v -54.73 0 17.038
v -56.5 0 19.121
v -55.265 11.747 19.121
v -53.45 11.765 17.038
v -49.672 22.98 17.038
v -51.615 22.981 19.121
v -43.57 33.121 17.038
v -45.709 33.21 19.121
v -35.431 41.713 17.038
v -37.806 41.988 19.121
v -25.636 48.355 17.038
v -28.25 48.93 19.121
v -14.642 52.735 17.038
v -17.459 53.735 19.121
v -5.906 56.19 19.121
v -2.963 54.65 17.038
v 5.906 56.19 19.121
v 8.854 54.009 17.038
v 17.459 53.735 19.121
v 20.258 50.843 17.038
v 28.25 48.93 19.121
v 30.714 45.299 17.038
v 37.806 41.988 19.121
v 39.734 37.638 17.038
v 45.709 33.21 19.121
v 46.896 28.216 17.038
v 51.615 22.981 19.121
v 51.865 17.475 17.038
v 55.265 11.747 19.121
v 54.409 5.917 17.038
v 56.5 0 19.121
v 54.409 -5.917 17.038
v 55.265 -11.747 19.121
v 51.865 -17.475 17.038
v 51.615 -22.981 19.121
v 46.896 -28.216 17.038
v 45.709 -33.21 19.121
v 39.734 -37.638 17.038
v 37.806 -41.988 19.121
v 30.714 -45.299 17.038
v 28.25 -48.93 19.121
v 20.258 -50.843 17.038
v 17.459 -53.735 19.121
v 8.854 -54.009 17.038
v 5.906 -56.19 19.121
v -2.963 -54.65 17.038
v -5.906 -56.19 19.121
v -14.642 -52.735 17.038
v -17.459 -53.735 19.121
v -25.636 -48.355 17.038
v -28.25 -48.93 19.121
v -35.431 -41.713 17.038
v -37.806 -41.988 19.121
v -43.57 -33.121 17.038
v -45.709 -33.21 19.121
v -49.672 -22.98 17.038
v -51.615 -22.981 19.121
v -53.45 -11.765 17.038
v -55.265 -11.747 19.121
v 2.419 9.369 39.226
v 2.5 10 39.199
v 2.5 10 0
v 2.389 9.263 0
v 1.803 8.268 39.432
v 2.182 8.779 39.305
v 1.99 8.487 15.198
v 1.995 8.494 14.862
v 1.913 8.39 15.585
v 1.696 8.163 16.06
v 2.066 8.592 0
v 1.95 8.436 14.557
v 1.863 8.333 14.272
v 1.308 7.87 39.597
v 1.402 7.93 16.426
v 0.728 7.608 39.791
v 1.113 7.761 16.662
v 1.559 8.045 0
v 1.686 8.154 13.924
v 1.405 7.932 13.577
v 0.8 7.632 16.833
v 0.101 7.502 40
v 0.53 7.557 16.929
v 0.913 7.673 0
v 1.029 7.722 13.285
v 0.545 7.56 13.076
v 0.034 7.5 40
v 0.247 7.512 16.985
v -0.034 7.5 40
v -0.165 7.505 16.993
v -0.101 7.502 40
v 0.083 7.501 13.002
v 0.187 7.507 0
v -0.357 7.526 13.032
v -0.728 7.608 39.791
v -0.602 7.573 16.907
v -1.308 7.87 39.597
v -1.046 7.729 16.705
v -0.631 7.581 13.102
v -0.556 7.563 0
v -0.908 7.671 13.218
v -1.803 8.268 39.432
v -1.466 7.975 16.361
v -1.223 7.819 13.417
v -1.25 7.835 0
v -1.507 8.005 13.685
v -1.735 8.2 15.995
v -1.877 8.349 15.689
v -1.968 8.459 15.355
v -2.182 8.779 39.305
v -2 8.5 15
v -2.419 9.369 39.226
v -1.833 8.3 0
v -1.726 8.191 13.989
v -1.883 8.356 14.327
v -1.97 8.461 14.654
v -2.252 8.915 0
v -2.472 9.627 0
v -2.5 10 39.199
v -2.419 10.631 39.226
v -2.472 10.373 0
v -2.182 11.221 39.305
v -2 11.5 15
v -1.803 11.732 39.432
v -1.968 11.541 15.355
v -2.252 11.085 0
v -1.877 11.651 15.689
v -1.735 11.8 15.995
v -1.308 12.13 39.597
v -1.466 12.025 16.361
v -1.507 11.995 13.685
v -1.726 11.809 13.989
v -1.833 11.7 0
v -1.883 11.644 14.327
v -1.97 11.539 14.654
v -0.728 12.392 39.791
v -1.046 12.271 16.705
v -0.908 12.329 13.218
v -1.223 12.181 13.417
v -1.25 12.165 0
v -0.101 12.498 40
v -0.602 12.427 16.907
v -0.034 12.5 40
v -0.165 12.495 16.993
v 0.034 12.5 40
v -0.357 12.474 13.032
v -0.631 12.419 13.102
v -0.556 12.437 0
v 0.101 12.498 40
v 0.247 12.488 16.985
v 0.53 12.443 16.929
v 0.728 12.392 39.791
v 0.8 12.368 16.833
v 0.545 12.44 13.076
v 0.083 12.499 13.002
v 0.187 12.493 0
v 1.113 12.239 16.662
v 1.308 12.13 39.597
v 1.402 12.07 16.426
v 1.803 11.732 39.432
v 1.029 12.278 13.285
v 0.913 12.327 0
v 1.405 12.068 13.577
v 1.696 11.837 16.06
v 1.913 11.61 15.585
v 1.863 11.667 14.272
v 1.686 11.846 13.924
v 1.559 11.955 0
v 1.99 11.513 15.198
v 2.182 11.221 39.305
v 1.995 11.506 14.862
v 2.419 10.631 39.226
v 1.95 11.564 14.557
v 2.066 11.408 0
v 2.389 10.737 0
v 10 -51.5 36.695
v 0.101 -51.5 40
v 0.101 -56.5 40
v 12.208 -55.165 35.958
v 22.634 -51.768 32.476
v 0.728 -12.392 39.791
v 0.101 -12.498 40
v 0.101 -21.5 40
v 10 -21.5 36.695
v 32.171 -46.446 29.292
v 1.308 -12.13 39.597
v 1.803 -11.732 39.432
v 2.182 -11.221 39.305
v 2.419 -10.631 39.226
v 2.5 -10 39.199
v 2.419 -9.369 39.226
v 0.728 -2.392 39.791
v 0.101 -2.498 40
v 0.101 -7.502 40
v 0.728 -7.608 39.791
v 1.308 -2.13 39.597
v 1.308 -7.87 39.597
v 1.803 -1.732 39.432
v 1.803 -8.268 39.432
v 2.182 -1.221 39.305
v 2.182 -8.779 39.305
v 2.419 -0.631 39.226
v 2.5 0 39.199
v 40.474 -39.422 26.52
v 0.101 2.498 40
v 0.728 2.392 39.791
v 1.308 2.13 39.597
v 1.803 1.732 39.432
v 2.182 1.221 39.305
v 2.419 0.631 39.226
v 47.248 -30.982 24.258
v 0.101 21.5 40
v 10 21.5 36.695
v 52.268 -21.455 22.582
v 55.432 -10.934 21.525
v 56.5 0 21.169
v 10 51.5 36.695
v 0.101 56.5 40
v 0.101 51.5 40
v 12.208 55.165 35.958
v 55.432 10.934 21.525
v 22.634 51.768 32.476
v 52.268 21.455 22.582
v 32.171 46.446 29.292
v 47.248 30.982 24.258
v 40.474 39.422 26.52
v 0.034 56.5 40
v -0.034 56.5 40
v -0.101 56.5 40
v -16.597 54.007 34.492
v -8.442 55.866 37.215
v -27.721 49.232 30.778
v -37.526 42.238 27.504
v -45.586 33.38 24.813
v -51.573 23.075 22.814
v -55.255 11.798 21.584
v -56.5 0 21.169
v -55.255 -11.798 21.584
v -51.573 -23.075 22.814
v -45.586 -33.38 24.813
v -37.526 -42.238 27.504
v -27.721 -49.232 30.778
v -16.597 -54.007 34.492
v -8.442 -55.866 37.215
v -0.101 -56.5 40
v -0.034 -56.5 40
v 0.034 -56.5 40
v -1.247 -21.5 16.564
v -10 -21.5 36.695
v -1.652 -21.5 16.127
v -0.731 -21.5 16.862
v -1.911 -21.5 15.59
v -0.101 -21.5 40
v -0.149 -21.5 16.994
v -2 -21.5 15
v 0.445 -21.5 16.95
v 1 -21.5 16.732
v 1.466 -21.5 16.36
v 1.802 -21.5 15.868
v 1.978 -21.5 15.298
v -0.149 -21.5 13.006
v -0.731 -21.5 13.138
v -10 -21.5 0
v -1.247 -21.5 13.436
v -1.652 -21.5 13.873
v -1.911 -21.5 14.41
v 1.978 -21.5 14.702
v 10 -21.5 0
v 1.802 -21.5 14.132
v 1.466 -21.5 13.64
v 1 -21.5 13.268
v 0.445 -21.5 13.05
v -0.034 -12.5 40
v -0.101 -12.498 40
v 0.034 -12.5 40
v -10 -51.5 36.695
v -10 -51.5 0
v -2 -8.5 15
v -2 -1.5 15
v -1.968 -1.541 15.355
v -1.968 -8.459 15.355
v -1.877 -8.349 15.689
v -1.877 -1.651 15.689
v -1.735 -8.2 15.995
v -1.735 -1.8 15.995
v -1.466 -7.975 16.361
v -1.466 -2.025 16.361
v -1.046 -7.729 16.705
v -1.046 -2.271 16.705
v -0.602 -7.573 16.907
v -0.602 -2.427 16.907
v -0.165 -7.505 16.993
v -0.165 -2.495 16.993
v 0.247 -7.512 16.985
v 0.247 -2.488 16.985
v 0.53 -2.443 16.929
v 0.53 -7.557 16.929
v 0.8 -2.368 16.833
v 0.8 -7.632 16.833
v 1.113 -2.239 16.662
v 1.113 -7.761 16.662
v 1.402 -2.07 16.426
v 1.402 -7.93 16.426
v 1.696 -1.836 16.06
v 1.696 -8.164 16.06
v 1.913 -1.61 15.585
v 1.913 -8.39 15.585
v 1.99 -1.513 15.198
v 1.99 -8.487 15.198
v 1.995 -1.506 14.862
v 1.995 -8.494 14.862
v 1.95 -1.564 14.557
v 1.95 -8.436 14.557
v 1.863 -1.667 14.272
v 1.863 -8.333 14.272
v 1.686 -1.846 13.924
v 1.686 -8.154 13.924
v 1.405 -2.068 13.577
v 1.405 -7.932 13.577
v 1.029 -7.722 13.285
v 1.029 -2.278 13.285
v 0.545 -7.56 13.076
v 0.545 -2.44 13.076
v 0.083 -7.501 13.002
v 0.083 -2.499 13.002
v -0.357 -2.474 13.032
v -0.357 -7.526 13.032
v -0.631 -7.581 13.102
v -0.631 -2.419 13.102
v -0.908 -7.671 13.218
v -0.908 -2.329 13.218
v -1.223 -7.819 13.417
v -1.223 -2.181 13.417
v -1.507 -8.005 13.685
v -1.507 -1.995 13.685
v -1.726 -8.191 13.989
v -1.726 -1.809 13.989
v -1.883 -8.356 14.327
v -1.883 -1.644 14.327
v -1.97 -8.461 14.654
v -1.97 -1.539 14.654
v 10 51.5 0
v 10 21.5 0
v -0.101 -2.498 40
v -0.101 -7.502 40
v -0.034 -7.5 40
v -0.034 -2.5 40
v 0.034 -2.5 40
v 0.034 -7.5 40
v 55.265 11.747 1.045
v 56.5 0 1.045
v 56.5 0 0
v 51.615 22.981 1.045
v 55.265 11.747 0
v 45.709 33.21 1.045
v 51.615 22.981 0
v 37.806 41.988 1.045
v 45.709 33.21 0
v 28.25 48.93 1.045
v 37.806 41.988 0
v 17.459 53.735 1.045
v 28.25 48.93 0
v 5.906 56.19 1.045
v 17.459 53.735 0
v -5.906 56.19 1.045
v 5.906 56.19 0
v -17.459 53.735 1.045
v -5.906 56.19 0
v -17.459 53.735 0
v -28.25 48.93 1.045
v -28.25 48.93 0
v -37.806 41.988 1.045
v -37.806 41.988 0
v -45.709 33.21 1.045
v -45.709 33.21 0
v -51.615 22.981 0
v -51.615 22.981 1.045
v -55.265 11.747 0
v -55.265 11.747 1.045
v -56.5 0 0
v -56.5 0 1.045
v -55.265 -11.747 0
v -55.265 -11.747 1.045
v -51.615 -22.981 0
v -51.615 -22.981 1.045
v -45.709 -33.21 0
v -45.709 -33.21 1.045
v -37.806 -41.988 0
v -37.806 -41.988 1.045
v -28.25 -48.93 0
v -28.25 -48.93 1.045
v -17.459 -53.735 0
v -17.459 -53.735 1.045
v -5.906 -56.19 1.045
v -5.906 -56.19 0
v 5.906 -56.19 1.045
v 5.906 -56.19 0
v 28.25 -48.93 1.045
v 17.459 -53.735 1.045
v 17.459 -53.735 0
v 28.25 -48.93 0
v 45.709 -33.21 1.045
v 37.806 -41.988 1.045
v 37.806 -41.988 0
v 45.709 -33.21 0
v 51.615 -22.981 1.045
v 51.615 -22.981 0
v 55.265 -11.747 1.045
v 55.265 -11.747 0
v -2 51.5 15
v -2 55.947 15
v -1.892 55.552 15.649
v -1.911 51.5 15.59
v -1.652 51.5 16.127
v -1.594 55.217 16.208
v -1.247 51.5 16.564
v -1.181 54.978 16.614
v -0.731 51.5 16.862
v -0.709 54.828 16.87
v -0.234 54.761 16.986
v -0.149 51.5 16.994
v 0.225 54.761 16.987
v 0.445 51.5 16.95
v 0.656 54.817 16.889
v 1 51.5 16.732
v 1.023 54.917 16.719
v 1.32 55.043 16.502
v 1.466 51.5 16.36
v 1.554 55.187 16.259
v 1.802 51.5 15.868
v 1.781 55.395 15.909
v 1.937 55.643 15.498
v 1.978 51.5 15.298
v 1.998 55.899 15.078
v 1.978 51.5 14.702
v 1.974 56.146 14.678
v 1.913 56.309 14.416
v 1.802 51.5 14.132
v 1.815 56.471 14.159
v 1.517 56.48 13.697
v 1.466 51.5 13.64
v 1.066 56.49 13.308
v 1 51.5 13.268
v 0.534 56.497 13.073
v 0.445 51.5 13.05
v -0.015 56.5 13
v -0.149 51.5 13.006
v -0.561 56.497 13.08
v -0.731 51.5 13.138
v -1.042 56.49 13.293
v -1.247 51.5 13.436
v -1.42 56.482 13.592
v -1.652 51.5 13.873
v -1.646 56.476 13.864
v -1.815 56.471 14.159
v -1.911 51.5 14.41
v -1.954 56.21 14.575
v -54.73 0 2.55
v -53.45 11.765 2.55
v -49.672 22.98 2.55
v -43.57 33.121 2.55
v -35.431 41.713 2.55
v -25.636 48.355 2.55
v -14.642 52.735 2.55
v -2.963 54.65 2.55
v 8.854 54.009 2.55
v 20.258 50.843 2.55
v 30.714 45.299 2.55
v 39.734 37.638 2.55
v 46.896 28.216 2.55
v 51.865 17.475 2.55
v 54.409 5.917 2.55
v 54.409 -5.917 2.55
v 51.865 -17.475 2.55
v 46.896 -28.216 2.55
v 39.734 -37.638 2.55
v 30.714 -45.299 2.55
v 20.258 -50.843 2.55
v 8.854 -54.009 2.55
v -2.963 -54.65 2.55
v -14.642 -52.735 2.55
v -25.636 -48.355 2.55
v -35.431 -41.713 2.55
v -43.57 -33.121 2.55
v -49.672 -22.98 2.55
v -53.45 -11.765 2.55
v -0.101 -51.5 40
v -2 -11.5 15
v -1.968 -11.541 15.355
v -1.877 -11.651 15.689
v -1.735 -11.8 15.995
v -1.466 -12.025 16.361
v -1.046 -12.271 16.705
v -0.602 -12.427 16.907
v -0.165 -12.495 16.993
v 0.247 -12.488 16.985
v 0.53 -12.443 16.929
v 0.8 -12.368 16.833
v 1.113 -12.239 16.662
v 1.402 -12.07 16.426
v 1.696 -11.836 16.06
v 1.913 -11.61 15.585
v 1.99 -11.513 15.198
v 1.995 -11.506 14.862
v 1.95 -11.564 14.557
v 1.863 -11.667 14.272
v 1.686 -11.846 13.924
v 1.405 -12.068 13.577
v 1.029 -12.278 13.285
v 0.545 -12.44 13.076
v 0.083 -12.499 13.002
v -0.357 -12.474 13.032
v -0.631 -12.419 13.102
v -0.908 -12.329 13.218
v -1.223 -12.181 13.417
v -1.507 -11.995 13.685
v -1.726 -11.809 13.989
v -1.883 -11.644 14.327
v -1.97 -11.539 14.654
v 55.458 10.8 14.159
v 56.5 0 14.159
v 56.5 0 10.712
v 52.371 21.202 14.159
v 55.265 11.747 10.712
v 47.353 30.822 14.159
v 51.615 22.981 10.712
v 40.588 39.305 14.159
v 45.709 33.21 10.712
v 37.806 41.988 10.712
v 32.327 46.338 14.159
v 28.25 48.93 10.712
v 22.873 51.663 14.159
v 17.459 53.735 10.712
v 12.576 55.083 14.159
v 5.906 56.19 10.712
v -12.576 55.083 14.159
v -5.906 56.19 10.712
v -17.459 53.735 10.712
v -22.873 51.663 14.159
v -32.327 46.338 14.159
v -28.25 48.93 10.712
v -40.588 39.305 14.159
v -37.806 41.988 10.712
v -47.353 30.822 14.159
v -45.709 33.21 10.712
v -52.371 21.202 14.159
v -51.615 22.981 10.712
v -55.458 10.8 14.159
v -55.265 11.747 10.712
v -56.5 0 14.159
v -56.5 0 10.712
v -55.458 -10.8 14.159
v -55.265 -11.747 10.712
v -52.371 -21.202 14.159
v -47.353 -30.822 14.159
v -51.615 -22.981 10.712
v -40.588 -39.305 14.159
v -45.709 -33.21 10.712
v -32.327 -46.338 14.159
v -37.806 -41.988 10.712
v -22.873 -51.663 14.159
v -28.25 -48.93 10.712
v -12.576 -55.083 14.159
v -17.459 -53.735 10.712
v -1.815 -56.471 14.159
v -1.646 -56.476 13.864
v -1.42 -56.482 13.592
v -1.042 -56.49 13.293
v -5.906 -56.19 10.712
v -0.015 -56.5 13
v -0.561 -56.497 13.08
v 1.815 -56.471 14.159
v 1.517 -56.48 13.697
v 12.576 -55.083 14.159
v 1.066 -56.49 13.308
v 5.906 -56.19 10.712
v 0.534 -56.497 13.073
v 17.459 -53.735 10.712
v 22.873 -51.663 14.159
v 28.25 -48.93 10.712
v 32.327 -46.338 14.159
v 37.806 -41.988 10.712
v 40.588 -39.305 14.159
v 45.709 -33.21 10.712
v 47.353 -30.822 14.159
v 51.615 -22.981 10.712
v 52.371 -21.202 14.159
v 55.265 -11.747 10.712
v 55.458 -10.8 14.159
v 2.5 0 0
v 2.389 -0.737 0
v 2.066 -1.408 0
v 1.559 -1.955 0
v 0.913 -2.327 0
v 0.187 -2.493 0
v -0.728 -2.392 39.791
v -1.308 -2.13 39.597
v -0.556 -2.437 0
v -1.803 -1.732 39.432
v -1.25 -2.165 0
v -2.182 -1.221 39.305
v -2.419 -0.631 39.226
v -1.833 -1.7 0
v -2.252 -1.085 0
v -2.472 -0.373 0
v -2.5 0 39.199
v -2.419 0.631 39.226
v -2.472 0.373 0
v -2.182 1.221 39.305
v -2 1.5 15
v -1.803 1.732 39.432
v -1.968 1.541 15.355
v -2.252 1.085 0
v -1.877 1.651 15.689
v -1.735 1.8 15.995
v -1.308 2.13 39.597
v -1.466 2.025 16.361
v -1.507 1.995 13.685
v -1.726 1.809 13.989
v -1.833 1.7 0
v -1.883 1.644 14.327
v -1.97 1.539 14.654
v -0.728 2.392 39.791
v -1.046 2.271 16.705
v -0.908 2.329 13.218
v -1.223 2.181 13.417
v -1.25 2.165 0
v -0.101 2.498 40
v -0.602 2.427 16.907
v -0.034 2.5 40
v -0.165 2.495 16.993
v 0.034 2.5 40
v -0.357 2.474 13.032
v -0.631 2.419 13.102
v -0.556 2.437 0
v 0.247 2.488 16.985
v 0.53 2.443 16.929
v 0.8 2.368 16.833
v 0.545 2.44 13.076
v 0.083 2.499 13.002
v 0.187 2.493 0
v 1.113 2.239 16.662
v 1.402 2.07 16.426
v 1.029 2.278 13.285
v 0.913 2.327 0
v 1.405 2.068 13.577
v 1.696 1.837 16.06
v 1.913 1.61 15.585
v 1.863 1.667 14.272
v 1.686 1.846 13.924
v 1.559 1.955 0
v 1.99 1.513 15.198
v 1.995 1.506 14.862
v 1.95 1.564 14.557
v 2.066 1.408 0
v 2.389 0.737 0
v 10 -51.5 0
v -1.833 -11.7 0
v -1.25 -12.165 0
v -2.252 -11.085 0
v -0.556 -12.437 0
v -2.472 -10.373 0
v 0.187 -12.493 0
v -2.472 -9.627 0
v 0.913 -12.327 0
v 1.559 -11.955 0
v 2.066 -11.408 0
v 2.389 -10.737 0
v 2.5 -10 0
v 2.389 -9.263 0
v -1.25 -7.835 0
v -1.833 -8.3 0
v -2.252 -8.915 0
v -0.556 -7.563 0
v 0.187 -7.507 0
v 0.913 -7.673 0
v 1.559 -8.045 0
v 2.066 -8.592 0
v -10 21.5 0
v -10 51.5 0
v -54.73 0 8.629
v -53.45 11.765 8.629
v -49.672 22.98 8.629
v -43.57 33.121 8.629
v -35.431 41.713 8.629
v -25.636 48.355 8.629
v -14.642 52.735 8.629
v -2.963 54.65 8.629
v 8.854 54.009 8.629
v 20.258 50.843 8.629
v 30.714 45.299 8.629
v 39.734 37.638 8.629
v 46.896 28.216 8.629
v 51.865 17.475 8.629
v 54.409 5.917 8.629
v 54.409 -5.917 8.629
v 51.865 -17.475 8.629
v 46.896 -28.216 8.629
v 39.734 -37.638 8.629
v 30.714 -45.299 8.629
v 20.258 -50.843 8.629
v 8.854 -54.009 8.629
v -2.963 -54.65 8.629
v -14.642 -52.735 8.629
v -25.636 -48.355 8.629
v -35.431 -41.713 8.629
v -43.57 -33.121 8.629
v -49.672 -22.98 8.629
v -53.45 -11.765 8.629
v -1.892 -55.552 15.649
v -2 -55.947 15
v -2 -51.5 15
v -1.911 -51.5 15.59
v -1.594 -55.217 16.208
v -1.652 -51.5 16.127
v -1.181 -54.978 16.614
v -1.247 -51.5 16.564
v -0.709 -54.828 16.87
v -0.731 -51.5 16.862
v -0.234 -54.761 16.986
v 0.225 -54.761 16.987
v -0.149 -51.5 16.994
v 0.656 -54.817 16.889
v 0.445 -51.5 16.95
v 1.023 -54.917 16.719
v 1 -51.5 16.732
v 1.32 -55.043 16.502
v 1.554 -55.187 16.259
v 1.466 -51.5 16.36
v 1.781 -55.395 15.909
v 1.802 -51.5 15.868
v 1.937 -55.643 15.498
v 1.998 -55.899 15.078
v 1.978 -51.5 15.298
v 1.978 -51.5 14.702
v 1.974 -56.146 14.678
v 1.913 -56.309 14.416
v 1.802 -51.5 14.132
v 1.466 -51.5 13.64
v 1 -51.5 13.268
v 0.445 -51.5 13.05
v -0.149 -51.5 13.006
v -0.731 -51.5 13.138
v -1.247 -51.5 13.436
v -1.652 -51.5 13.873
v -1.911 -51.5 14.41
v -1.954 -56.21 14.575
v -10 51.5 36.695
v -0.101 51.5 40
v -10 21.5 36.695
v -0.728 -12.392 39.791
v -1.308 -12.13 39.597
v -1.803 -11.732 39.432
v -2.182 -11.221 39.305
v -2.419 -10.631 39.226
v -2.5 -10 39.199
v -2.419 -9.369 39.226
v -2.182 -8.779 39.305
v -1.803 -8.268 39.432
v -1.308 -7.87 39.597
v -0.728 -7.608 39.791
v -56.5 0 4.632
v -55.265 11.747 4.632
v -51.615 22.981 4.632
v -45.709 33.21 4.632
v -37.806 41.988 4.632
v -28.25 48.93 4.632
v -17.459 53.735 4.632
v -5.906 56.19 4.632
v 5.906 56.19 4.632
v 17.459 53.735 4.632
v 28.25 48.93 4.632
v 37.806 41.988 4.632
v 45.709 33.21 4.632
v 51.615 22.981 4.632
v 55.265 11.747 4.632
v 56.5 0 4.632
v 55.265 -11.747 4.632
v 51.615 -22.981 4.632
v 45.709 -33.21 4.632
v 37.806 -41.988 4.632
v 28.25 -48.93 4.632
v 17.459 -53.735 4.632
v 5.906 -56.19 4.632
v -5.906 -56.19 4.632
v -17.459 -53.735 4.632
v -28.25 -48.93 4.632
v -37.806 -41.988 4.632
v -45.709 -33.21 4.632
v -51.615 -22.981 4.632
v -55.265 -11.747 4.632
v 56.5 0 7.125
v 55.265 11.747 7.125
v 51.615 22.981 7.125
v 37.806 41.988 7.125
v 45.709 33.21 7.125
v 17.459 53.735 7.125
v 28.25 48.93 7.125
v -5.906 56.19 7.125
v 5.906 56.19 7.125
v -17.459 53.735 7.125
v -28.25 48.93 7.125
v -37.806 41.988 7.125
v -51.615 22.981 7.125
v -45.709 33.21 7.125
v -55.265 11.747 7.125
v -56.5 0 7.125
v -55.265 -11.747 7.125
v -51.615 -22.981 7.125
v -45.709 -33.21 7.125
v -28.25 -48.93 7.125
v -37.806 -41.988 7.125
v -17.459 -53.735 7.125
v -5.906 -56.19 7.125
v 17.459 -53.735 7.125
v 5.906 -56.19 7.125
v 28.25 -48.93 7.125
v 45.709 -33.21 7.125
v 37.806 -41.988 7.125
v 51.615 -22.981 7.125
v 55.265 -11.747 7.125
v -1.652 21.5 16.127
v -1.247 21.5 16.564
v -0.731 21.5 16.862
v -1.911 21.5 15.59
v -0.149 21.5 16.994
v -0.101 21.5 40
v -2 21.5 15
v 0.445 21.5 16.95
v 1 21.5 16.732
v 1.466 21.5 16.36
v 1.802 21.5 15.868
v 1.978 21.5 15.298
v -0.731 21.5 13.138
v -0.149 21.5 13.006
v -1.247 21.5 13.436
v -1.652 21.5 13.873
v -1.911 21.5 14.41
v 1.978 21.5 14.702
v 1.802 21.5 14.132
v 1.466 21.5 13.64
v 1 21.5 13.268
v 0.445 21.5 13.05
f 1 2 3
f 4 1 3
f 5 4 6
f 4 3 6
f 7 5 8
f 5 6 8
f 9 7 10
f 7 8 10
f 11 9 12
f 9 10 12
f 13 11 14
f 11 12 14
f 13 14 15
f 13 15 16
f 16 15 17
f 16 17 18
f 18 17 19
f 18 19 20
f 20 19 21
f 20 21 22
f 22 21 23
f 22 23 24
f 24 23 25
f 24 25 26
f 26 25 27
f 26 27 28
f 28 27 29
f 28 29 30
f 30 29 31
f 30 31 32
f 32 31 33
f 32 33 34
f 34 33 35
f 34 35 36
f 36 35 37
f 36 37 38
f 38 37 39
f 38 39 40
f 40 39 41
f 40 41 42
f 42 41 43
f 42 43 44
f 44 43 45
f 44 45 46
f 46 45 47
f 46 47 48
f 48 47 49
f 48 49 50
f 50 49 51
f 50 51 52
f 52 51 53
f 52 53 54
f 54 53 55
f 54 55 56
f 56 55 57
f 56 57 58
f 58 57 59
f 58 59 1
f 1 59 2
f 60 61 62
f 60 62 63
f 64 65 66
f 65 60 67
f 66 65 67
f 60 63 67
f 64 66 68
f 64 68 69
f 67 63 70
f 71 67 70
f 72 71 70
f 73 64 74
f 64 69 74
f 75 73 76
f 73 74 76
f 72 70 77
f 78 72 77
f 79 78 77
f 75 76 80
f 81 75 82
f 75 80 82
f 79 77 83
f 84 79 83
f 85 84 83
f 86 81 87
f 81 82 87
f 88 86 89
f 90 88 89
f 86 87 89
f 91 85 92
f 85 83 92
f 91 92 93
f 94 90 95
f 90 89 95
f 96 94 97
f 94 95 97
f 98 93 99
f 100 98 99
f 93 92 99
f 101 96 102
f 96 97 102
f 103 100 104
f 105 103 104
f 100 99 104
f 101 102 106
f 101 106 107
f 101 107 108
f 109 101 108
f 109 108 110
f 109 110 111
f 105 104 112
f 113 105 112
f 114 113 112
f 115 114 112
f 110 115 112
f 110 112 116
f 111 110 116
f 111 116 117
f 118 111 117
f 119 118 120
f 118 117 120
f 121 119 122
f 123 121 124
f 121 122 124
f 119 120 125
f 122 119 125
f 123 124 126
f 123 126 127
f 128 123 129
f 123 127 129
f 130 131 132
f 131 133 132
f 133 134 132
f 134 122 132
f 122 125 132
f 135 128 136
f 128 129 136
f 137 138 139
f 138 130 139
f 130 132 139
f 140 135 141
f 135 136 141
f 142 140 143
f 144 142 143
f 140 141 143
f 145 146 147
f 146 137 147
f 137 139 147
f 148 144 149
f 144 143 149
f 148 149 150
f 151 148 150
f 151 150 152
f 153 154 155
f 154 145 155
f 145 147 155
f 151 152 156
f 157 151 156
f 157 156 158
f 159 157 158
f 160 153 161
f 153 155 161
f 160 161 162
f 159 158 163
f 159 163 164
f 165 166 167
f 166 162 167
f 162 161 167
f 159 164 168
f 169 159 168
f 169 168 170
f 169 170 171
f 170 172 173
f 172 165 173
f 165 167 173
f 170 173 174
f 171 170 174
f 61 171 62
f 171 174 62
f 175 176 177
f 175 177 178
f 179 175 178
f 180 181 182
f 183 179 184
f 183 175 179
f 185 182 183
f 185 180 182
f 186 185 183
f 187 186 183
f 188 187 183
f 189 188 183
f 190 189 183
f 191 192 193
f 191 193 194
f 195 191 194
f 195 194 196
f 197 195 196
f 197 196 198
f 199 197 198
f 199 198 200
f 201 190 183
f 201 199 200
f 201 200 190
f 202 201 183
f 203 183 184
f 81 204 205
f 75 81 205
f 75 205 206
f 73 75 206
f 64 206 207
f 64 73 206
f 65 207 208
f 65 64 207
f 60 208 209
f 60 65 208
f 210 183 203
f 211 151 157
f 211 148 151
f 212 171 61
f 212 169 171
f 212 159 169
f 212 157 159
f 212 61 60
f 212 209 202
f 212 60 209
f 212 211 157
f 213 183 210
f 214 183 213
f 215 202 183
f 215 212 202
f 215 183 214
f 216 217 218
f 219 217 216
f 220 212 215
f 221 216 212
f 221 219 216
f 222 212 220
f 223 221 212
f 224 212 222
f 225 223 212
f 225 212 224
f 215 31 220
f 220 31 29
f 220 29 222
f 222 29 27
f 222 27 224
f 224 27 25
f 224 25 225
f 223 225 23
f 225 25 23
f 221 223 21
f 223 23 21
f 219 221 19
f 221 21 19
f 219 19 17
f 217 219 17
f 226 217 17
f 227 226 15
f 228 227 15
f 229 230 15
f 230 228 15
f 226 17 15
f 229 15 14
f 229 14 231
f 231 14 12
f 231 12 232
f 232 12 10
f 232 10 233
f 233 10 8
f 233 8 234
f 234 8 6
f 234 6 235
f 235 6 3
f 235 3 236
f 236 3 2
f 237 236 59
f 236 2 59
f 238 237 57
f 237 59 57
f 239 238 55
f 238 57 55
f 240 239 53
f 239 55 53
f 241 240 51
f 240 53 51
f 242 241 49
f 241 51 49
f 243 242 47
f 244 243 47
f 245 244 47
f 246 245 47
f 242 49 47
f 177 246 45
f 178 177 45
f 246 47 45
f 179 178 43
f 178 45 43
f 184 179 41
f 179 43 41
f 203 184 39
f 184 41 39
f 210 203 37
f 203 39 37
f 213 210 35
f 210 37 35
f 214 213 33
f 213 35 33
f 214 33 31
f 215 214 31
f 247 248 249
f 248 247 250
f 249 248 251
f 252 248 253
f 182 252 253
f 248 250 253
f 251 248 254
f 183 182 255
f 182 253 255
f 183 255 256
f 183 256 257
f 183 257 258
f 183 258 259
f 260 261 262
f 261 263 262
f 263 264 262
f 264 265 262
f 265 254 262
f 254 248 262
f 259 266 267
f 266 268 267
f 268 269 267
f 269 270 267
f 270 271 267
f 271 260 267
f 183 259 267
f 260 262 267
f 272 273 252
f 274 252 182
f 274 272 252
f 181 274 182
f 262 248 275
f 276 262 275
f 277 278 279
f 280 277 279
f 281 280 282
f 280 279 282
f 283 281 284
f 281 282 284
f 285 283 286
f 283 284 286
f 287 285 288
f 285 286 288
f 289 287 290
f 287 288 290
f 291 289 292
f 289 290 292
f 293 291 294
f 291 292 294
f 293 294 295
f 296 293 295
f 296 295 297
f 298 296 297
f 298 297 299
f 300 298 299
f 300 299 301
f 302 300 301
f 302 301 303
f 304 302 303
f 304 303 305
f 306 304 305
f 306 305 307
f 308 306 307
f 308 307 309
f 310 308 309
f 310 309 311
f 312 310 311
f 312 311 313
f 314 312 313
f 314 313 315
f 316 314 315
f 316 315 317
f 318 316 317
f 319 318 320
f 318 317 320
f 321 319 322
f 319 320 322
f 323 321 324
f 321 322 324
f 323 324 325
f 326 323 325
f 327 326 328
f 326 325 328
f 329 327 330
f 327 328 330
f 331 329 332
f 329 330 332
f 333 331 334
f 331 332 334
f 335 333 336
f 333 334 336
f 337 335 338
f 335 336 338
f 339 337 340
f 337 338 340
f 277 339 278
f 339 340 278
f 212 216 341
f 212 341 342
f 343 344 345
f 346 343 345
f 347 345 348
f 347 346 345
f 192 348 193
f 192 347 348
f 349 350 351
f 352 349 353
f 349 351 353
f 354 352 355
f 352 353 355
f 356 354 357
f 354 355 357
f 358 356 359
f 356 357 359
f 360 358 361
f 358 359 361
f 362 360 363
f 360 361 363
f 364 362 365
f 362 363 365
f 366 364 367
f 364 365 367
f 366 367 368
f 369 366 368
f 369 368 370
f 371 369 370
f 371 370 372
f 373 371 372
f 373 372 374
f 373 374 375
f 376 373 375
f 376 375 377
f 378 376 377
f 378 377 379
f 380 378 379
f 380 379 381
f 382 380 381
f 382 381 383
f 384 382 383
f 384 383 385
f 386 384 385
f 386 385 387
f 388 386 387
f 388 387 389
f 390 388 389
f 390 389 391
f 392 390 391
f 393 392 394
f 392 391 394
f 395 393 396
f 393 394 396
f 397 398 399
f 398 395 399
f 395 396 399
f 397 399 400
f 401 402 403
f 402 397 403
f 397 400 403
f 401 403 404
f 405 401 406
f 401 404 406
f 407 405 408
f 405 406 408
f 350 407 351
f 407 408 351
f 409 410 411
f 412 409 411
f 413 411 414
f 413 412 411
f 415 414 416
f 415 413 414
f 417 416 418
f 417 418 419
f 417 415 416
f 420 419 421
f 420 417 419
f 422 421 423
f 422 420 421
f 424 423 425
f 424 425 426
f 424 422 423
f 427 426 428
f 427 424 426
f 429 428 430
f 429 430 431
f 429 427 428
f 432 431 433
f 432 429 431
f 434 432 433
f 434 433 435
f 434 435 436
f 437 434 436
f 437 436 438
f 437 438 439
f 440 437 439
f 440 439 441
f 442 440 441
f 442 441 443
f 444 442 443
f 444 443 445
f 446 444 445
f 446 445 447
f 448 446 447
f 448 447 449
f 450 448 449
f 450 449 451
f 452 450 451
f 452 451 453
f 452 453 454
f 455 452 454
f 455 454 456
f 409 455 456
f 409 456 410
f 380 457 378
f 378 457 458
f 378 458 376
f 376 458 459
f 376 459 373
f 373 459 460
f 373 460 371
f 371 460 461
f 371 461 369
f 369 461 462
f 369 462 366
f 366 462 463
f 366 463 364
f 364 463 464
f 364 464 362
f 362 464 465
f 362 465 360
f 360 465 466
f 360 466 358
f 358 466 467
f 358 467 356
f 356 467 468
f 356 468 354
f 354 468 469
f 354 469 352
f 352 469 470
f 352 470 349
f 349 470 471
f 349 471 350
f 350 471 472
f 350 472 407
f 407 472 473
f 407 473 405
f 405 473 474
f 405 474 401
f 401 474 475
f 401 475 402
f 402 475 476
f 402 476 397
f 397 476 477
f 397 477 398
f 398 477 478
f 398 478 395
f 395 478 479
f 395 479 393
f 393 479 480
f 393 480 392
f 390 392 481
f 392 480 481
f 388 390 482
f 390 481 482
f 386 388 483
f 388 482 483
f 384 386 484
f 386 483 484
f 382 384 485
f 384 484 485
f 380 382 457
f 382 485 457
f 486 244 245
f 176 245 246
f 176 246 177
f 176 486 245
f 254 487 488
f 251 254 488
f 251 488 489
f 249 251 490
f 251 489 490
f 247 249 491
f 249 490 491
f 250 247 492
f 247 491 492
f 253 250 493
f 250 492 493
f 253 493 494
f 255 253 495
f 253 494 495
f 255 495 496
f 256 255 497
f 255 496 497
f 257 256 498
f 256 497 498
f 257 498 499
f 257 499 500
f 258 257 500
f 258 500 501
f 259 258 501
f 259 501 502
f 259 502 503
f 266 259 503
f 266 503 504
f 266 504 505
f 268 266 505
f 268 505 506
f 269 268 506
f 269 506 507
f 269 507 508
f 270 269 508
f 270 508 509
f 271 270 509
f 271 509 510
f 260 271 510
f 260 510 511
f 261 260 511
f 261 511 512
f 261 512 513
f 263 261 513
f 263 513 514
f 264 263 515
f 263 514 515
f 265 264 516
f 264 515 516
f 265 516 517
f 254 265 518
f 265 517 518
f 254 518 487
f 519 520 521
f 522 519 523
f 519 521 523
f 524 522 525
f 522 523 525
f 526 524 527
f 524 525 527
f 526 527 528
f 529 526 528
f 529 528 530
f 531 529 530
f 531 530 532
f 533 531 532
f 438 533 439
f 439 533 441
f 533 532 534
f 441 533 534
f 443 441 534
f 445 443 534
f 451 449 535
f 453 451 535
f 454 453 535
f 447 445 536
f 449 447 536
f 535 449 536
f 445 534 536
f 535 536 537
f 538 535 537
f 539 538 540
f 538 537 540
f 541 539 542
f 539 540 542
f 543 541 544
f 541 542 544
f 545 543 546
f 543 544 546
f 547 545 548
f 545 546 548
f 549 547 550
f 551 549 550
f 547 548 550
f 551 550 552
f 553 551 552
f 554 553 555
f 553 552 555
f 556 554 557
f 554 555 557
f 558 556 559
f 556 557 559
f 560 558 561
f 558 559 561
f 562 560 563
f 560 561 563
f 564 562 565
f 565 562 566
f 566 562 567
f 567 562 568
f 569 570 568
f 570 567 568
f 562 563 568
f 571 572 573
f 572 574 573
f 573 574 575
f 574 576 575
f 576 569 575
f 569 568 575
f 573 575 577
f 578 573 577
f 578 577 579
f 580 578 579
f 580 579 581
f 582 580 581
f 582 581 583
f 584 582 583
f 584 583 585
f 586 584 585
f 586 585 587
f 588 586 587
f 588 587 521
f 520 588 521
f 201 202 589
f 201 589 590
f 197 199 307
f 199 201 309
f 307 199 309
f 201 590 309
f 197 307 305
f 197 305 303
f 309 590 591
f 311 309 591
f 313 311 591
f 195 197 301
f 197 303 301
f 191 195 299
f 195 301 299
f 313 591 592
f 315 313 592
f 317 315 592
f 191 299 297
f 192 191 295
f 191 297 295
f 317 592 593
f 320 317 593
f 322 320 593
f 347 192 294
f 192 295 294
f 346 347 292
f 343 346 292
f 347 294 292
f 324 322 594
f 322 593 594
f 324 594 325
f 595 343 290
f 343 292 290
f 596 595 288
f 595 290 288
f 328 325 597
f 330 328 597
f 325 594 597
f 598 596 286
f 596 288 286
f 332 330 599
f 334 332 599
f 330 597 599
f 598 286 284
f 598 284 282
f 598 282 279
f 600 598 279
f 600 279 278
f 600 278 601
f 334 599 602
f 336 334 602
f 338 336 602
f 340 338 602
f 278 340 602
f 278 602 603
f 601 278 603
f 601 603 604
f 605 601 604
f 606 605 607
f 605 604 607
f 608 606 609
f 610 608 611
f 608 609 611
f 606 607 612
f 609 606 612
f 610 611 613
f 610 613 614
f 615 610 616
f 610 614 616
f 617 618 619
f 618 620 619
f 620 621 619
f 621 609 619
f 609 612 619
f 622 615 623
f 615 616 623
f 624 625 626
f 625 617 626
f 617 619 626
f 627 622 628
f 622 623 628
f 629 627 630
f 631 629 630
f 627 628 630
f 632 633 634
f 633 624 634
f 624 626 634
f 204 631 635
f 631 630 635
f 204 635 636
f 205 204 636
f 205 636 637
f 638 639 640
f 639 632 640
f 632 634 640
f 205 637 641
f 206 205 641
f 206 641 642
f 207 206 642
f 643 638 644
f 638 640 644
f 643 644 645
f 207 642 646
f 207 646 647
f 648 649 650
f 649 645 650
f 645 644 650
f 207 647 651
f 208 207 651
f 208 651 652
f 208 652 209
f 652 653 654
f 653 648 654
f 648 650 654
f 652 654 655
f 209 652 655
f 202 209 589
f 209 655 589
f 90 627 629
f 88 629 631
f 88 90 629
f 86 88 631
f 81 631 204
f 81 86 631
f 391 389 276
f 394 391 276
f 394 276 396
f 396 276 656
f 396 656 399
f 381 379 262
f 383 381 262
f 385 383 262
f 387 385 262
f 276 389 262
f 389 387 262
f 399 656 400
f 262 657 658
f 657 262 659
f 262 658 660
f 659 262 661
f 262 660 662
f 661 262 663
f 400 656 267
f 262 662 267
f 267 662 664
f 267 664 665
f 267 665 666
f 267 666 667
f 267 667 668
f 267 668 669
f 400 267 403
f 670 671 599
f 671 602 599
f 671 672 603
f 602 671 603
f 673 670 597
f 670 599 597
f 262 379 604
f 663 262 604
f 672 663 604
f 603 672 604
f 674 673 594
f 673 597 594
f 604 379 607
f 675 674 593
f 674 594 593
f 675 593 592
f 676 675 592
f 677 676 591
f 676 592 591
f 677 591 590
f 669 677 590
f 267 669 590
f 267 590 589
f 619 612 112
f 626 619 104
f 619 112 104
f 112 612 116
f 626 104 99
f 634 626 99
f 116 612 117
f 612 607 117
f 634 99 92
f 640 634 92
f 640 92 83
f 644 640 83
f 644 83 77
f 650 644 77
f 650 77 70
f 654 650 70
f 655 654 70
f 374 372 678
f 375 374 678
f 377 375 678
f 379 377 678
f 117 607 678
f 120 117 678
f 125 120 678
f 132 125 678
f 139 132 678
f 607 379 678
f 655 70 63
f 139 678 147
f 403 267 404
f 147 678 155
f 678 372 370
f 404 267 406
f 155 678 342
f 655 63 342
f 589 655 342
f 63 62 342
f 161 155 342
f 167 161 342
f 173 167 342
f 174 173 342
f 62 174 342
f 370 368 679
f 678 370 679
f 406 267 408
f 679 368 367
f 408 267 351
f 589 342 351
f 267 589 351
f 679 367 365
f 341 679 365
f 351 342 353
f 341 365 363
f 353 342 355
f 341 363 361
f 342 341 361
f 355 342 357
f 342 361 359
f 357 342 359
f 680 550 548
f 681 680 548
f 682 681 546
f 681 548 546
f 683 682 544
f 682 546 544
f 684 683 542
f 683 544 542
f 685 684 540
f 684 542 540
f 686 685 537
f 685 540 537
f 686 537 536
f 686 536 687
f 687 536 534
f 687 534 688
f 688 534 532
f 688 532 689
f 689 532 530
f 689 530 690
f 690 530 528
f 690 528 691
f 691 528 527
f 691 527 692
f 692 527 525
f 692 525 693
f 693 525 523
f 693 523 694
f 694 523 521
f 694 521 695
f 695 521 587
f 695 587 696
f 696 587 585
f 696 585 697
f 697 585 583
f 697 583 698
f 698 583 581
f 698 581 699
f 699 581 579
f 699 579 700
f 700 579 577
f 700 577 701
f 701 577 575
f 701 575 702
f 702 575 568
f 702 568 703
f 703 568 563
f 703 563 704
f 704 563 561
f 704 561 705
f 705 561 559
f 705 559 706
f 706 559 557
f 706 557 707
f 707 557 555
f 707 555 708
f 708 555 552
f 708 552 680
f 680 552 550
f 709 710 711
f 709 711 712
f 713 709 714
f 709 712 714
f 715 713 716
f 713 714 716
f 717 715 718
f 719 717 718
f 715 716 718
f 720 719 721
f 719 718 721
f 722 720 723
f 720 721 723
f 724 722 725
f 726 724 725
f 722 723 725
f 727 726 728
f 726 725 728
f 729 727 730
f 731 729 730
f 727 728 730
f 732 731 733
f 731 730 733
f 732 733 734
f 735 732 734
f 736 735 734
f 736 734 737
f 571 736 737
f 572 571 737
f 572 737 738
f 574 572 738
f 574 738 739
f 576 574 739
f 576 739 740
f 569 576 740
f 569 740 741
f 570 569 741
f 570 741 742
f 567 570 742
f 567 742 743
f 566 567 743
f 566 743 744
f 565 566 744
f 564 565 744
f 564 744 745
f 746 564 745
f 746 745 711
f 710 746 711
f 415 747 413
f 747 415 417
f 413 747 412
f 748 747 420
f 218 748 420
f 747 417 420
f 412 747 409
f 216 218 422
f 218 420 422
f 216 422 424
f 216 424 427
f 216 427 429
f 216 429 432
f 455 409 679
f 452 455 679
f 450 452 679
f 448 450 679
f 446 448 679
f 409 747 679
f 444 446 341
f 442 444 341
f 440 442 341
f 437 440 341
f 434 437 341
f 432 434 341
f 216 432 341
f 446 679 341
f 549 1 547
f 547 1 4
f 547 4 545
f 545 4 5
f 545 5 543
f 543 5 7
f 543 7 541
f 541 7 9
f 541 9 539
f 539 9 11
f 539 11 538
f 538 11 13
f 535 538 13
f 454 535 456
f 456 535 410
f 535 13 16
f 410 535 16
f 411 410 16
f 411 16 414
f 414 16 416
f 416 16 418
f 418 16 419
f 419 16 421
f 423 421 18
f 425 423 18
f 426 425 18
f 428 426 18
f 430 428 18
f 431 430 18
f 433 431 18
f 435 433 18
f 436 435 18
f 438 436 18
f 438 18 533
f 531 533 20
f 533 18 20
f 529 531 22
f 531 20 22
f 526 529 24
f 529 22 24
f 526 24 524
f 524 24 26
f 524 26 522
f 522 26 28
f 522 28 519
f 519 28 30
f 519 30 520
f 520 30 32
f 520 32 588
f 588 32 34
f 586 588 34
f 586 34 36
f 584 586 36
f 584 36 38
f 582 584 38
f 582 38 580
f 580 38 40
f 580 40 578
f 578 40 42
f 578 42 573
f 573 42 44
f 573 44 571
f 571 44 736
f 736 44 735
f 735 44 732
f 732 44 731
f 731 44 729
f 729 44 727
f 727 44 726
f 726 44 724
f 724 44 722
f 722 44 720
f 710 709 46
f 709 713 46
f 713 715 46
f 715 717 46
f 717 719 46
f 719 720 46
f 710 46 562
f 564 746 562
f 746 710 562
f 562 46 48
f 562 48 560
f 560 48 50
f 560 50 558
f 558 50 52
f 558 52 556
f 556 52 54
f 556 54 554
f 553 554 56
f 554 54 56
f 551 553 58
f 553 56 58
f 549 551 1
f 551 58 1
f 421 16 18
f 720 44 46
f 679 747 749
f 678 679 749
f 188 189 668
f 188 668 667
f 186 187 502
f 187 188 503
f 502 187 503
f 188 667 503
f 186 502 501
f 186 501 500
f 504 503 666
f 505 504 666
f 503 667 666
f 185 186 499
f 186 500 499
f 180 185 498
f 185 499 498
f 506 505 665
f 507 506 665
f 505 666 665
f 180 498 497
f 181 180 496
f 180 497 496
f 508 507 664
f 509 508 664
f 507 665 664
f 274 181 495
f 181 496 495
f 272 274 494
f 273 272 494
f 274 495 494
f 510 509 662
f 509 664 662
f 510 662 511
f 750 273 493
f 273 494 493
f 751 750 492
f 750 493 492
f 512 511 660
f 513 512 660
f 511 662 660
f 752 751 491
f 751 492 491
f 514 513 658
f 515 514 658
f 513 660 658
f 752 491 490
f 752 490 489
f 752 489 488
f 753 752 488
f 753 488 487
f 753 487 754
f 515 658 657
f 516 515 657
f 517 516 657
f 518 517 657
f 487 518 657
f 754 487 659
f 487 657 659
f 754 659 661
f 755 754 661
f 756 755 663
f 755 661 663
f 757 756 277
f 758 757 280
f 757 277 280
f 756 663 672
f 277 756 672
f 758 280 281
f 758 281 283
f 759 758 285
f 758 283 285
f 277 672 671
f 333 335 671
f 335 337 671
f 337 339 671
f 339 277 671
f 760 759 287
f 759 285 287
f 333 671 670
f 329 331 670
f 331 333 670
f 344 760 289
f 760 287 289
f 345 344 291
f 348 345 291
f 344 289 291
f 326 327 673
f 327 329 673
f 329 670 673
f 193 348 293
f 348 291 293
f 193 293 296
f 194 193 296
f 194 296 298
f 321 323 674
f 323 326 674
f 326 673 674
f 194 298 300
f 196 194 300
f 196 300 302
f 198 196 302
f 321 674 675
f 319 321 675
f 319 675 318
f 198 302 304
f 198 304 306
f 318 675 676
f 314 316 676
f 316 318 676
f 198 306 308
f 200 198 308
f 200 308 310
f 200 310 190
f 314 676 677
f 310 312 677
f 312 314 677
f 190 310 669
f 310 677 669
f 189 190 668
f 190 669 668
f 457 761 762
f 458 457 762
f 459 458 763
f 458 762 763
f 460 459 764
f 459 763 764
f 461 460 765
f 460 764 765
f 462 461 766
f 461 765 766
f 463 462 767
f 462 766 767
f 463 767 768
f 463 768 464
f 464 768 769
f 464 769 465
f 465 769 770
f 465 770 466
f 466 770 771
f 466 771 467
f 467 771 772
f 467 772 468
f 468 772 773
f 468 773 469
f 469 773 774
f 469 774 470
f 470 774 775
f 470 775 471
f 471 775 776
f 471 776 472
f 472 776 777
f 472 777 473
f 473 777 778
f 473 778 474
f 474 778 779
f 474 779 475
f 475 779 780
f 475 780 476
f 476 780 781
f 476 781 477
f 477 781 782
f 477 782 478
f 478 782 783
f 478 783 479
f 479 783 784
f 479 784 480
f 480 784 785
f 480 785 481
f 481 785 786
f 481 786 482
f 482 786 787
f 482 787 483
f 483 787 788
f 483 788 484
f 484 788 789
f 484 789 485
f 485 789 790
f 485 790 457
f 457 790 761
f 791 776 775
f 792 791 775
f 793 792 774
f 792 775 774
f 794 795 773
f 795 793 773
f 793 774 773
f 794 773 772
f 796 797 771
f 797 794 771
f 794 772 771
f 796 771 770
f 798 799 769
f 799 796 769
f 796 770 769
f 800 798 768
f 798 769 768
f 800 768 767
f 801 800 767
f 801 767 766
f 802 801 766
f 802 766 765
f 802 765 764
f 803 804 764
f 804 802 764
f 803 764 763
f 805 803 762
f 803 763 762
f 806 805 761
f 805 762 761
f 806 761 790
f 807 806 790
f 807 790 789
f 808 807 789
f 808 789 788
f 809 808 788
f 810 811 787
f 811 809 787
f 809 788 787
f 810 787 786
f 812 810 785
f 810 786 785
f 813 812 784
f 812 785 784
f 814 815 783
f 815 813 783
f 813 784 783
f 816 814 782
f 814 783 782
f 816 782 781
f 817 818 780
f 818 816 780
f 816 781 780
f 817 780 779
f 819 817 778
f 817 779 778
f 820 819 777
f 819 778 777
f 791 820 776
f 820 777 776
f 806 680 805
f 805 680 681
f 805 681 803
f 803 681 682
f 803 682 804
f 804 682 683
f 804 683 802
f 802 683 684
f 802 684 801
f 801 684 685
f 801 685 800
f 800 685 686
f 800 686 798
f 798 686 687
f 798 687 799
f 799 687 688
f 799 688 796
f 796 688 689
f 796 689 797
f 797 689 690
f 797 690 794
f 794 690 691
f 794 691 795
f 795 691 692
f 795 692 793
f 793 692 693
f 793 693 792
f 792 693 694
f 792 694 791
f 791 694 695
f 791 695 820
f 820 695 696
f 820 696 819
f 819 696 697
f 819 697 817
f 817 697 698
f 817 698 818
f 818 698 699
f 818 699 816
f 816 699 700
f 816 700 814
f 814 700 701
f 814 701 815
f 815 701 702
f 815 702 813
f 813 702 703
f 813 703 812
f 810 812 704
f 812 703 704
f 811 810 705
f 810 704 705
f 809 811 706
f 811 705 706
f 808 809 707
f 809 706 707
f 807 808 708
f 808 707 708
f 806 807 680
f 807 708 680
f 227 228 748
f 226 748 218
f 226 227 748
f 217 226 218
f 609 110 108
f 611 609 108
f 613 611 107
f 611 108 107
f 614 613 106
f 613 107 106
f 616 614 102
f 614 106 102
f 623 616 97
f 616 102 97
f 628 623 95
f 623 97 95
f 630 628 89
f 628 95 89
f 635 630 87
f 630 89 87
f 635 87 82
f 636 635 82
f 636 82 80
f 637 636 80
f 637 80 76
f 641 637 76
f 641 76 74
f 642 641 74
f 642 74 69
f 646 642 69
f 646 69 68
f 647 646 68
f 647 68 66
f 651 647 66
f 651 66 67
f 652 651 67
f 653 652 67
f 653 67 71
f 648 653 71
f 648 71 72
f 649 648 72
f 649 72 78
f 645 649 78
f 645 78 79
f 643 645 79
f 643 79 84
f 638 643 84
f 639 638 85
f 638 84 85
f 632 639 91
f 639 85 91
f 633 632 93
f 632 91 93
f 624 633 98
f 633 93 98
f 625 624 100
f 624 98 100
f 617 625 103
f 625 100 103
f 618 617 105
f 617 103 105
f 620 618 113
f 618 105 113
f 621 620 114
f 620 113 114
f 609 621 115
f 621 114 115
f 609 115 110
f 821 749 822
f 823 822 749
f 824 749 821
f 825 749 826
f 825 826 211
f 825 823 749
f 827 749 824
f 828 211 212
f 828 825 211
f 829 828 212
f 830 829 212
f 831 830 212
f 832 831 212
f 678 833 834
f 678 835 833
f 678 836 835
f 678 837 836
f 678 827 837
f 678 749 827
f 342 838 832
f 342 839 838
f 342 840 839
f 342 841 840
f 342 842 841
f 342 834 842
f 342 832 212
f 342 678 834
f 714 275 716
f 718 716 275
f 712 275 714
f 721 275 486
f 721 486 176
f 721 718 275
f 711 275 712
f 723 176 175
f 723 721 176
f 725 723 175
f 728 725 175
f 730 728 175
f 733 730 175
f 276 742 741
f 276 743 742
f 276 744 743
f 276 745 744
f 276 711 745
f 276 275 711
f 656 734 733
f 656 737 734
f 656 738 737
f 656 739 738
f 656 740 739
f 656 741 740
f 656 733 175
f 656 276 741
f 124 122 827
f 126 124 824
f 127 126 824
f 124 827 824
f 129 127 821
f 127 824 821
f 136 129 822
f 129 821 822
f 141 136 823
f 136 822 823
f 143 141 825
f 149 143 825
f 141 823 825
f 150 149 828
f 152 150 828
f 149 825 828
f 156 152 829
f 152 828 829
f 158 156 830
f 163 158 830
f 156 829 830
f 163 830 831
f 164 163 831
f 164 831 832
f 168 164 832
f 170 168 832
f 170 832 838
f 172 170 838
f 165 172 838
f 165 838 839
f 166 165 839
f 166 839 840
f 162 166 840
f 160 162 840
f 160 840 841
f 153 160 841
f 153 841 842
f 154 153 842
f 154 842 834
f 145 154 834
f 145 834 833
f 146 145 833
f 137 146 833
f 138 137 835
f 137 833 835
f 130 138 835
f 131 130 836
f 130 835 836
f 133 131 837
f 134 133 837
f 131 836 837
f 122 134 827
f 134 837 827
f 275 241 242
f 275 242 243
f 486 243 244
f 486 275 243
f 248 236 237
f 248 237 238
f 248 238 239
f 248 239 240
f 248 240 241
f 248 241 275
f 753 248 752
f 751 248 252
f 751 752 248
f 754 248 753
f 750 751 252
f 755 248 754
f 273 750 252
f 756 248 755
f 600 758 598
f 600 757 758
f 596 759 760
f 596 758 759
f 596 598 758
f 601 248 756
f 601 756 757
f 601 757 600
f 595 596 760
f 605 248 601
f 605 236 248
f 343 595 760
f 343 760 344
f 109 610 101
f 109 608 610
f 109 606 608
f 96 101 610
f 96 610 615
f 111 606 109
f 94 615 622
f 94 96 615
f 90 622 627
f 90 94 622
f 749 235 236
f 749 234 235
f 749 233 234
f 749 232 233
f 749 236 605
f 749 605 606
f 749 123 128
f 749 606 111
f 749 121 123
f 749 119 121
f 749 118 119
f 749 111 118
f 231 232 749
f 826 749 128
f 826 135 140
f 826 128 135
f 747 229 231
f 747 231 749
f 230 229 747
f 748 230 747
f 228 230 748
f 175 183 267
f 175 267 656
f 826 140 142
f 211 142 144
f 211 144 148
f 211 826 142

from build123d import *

# Parameters (mm, degrees)
F0_R          = 56.5
F1_DEPTH      = 40
F3_DEPTH      = 56.501
F3_DEPTH_BACK = 56.501
F4_R          = 2.5
F4_W          = 20
F4_H          = 30
F5_DEPTH      = 40.001
F6_R          = 2
F7_DEPTH      = 78.001
F7_DEPTH_BACK = 35.001


with BuildPart() as f1:
    # F0 (on Top) → F1 (new body)
    with BuildSketch(Plane.XY):
        Circle(F0_R)
    extrude(amount=F1_DEPTH)

    # F2 (on Front) → F3 (cut, two sides)
    with BuildSketch(Plane.XZ) as f3_sk:
        Polygon((-60, 20), (0, 40.03386572), (60, 20), (60, 50.03386572), (0, 50.03386572), (-60, 50.03386572), align=None)
    extrude(amount=-F3_DEPTH, mode=Mode.SUBTRACT)
    extrude(f3_sk.sketch, amount=F3_DEPTH_BACK, mode=Mode.SUBTRACT)

    # F4 (on face) → F5 (cut, through all)
    with BuildSketch(Plane(origin=(0, 0, 0), x_dir=(1, 0, 0), z_dir=(0, 0, -1))):
        Circle(F4_R)
        with Locations((0, -10)):
            Circle(F4_R)
        with Locations((0, 10)):
            Circle(F4_R)
        with Locations((0, 36.5)):
            Rectangle(F4_W, F4_H)
        with Locations((0, -36.5)):
            Rectangle(F4_W, F4_H)
    extrude(amount=-F5_DEPTH, mode=Mode.SUBTRACT)

    # F6 (on face) → F7 (cut, two sides)
    with BuildSketch(Plane(origin=(0, 21.5, 0), x_dir=(-1, 0, 0), z_dir=(0, 1, 0))) as f7_sk:
        with Locations((0, 15)):
            Circle(F6_R)
    extrude(amount=-F7_DEPTH, mode=Mode.SUBTRACT)
    extrude(f7_sk.sketch, amount=F7_DEPTH_BACK, mode=Mode.SUBTRACT)

    # F8 (on Front) → F9 (revolve, cut)
    with BuildSketch(Plane.XZ):
        Polygon((-54.7298887074, 17.0381178779), (-57.7298887074, 20.5675298348), (-93.4339091182, 20.5675298348), (-93.4339091182, 0), (-57.7298887074, 0), (-54.7298887074, 2.5499998611), (-57.7298887074, 6.0794118181), (-54.7298887074, 8.6294116792), (-57.7298887074, 12.1588236361), align=None)
    revolve(axis=Axis((0, 0, 23.785918951), (0, 0, -1)), mode=Mode.SUBTRACT)


solid = f1.part
